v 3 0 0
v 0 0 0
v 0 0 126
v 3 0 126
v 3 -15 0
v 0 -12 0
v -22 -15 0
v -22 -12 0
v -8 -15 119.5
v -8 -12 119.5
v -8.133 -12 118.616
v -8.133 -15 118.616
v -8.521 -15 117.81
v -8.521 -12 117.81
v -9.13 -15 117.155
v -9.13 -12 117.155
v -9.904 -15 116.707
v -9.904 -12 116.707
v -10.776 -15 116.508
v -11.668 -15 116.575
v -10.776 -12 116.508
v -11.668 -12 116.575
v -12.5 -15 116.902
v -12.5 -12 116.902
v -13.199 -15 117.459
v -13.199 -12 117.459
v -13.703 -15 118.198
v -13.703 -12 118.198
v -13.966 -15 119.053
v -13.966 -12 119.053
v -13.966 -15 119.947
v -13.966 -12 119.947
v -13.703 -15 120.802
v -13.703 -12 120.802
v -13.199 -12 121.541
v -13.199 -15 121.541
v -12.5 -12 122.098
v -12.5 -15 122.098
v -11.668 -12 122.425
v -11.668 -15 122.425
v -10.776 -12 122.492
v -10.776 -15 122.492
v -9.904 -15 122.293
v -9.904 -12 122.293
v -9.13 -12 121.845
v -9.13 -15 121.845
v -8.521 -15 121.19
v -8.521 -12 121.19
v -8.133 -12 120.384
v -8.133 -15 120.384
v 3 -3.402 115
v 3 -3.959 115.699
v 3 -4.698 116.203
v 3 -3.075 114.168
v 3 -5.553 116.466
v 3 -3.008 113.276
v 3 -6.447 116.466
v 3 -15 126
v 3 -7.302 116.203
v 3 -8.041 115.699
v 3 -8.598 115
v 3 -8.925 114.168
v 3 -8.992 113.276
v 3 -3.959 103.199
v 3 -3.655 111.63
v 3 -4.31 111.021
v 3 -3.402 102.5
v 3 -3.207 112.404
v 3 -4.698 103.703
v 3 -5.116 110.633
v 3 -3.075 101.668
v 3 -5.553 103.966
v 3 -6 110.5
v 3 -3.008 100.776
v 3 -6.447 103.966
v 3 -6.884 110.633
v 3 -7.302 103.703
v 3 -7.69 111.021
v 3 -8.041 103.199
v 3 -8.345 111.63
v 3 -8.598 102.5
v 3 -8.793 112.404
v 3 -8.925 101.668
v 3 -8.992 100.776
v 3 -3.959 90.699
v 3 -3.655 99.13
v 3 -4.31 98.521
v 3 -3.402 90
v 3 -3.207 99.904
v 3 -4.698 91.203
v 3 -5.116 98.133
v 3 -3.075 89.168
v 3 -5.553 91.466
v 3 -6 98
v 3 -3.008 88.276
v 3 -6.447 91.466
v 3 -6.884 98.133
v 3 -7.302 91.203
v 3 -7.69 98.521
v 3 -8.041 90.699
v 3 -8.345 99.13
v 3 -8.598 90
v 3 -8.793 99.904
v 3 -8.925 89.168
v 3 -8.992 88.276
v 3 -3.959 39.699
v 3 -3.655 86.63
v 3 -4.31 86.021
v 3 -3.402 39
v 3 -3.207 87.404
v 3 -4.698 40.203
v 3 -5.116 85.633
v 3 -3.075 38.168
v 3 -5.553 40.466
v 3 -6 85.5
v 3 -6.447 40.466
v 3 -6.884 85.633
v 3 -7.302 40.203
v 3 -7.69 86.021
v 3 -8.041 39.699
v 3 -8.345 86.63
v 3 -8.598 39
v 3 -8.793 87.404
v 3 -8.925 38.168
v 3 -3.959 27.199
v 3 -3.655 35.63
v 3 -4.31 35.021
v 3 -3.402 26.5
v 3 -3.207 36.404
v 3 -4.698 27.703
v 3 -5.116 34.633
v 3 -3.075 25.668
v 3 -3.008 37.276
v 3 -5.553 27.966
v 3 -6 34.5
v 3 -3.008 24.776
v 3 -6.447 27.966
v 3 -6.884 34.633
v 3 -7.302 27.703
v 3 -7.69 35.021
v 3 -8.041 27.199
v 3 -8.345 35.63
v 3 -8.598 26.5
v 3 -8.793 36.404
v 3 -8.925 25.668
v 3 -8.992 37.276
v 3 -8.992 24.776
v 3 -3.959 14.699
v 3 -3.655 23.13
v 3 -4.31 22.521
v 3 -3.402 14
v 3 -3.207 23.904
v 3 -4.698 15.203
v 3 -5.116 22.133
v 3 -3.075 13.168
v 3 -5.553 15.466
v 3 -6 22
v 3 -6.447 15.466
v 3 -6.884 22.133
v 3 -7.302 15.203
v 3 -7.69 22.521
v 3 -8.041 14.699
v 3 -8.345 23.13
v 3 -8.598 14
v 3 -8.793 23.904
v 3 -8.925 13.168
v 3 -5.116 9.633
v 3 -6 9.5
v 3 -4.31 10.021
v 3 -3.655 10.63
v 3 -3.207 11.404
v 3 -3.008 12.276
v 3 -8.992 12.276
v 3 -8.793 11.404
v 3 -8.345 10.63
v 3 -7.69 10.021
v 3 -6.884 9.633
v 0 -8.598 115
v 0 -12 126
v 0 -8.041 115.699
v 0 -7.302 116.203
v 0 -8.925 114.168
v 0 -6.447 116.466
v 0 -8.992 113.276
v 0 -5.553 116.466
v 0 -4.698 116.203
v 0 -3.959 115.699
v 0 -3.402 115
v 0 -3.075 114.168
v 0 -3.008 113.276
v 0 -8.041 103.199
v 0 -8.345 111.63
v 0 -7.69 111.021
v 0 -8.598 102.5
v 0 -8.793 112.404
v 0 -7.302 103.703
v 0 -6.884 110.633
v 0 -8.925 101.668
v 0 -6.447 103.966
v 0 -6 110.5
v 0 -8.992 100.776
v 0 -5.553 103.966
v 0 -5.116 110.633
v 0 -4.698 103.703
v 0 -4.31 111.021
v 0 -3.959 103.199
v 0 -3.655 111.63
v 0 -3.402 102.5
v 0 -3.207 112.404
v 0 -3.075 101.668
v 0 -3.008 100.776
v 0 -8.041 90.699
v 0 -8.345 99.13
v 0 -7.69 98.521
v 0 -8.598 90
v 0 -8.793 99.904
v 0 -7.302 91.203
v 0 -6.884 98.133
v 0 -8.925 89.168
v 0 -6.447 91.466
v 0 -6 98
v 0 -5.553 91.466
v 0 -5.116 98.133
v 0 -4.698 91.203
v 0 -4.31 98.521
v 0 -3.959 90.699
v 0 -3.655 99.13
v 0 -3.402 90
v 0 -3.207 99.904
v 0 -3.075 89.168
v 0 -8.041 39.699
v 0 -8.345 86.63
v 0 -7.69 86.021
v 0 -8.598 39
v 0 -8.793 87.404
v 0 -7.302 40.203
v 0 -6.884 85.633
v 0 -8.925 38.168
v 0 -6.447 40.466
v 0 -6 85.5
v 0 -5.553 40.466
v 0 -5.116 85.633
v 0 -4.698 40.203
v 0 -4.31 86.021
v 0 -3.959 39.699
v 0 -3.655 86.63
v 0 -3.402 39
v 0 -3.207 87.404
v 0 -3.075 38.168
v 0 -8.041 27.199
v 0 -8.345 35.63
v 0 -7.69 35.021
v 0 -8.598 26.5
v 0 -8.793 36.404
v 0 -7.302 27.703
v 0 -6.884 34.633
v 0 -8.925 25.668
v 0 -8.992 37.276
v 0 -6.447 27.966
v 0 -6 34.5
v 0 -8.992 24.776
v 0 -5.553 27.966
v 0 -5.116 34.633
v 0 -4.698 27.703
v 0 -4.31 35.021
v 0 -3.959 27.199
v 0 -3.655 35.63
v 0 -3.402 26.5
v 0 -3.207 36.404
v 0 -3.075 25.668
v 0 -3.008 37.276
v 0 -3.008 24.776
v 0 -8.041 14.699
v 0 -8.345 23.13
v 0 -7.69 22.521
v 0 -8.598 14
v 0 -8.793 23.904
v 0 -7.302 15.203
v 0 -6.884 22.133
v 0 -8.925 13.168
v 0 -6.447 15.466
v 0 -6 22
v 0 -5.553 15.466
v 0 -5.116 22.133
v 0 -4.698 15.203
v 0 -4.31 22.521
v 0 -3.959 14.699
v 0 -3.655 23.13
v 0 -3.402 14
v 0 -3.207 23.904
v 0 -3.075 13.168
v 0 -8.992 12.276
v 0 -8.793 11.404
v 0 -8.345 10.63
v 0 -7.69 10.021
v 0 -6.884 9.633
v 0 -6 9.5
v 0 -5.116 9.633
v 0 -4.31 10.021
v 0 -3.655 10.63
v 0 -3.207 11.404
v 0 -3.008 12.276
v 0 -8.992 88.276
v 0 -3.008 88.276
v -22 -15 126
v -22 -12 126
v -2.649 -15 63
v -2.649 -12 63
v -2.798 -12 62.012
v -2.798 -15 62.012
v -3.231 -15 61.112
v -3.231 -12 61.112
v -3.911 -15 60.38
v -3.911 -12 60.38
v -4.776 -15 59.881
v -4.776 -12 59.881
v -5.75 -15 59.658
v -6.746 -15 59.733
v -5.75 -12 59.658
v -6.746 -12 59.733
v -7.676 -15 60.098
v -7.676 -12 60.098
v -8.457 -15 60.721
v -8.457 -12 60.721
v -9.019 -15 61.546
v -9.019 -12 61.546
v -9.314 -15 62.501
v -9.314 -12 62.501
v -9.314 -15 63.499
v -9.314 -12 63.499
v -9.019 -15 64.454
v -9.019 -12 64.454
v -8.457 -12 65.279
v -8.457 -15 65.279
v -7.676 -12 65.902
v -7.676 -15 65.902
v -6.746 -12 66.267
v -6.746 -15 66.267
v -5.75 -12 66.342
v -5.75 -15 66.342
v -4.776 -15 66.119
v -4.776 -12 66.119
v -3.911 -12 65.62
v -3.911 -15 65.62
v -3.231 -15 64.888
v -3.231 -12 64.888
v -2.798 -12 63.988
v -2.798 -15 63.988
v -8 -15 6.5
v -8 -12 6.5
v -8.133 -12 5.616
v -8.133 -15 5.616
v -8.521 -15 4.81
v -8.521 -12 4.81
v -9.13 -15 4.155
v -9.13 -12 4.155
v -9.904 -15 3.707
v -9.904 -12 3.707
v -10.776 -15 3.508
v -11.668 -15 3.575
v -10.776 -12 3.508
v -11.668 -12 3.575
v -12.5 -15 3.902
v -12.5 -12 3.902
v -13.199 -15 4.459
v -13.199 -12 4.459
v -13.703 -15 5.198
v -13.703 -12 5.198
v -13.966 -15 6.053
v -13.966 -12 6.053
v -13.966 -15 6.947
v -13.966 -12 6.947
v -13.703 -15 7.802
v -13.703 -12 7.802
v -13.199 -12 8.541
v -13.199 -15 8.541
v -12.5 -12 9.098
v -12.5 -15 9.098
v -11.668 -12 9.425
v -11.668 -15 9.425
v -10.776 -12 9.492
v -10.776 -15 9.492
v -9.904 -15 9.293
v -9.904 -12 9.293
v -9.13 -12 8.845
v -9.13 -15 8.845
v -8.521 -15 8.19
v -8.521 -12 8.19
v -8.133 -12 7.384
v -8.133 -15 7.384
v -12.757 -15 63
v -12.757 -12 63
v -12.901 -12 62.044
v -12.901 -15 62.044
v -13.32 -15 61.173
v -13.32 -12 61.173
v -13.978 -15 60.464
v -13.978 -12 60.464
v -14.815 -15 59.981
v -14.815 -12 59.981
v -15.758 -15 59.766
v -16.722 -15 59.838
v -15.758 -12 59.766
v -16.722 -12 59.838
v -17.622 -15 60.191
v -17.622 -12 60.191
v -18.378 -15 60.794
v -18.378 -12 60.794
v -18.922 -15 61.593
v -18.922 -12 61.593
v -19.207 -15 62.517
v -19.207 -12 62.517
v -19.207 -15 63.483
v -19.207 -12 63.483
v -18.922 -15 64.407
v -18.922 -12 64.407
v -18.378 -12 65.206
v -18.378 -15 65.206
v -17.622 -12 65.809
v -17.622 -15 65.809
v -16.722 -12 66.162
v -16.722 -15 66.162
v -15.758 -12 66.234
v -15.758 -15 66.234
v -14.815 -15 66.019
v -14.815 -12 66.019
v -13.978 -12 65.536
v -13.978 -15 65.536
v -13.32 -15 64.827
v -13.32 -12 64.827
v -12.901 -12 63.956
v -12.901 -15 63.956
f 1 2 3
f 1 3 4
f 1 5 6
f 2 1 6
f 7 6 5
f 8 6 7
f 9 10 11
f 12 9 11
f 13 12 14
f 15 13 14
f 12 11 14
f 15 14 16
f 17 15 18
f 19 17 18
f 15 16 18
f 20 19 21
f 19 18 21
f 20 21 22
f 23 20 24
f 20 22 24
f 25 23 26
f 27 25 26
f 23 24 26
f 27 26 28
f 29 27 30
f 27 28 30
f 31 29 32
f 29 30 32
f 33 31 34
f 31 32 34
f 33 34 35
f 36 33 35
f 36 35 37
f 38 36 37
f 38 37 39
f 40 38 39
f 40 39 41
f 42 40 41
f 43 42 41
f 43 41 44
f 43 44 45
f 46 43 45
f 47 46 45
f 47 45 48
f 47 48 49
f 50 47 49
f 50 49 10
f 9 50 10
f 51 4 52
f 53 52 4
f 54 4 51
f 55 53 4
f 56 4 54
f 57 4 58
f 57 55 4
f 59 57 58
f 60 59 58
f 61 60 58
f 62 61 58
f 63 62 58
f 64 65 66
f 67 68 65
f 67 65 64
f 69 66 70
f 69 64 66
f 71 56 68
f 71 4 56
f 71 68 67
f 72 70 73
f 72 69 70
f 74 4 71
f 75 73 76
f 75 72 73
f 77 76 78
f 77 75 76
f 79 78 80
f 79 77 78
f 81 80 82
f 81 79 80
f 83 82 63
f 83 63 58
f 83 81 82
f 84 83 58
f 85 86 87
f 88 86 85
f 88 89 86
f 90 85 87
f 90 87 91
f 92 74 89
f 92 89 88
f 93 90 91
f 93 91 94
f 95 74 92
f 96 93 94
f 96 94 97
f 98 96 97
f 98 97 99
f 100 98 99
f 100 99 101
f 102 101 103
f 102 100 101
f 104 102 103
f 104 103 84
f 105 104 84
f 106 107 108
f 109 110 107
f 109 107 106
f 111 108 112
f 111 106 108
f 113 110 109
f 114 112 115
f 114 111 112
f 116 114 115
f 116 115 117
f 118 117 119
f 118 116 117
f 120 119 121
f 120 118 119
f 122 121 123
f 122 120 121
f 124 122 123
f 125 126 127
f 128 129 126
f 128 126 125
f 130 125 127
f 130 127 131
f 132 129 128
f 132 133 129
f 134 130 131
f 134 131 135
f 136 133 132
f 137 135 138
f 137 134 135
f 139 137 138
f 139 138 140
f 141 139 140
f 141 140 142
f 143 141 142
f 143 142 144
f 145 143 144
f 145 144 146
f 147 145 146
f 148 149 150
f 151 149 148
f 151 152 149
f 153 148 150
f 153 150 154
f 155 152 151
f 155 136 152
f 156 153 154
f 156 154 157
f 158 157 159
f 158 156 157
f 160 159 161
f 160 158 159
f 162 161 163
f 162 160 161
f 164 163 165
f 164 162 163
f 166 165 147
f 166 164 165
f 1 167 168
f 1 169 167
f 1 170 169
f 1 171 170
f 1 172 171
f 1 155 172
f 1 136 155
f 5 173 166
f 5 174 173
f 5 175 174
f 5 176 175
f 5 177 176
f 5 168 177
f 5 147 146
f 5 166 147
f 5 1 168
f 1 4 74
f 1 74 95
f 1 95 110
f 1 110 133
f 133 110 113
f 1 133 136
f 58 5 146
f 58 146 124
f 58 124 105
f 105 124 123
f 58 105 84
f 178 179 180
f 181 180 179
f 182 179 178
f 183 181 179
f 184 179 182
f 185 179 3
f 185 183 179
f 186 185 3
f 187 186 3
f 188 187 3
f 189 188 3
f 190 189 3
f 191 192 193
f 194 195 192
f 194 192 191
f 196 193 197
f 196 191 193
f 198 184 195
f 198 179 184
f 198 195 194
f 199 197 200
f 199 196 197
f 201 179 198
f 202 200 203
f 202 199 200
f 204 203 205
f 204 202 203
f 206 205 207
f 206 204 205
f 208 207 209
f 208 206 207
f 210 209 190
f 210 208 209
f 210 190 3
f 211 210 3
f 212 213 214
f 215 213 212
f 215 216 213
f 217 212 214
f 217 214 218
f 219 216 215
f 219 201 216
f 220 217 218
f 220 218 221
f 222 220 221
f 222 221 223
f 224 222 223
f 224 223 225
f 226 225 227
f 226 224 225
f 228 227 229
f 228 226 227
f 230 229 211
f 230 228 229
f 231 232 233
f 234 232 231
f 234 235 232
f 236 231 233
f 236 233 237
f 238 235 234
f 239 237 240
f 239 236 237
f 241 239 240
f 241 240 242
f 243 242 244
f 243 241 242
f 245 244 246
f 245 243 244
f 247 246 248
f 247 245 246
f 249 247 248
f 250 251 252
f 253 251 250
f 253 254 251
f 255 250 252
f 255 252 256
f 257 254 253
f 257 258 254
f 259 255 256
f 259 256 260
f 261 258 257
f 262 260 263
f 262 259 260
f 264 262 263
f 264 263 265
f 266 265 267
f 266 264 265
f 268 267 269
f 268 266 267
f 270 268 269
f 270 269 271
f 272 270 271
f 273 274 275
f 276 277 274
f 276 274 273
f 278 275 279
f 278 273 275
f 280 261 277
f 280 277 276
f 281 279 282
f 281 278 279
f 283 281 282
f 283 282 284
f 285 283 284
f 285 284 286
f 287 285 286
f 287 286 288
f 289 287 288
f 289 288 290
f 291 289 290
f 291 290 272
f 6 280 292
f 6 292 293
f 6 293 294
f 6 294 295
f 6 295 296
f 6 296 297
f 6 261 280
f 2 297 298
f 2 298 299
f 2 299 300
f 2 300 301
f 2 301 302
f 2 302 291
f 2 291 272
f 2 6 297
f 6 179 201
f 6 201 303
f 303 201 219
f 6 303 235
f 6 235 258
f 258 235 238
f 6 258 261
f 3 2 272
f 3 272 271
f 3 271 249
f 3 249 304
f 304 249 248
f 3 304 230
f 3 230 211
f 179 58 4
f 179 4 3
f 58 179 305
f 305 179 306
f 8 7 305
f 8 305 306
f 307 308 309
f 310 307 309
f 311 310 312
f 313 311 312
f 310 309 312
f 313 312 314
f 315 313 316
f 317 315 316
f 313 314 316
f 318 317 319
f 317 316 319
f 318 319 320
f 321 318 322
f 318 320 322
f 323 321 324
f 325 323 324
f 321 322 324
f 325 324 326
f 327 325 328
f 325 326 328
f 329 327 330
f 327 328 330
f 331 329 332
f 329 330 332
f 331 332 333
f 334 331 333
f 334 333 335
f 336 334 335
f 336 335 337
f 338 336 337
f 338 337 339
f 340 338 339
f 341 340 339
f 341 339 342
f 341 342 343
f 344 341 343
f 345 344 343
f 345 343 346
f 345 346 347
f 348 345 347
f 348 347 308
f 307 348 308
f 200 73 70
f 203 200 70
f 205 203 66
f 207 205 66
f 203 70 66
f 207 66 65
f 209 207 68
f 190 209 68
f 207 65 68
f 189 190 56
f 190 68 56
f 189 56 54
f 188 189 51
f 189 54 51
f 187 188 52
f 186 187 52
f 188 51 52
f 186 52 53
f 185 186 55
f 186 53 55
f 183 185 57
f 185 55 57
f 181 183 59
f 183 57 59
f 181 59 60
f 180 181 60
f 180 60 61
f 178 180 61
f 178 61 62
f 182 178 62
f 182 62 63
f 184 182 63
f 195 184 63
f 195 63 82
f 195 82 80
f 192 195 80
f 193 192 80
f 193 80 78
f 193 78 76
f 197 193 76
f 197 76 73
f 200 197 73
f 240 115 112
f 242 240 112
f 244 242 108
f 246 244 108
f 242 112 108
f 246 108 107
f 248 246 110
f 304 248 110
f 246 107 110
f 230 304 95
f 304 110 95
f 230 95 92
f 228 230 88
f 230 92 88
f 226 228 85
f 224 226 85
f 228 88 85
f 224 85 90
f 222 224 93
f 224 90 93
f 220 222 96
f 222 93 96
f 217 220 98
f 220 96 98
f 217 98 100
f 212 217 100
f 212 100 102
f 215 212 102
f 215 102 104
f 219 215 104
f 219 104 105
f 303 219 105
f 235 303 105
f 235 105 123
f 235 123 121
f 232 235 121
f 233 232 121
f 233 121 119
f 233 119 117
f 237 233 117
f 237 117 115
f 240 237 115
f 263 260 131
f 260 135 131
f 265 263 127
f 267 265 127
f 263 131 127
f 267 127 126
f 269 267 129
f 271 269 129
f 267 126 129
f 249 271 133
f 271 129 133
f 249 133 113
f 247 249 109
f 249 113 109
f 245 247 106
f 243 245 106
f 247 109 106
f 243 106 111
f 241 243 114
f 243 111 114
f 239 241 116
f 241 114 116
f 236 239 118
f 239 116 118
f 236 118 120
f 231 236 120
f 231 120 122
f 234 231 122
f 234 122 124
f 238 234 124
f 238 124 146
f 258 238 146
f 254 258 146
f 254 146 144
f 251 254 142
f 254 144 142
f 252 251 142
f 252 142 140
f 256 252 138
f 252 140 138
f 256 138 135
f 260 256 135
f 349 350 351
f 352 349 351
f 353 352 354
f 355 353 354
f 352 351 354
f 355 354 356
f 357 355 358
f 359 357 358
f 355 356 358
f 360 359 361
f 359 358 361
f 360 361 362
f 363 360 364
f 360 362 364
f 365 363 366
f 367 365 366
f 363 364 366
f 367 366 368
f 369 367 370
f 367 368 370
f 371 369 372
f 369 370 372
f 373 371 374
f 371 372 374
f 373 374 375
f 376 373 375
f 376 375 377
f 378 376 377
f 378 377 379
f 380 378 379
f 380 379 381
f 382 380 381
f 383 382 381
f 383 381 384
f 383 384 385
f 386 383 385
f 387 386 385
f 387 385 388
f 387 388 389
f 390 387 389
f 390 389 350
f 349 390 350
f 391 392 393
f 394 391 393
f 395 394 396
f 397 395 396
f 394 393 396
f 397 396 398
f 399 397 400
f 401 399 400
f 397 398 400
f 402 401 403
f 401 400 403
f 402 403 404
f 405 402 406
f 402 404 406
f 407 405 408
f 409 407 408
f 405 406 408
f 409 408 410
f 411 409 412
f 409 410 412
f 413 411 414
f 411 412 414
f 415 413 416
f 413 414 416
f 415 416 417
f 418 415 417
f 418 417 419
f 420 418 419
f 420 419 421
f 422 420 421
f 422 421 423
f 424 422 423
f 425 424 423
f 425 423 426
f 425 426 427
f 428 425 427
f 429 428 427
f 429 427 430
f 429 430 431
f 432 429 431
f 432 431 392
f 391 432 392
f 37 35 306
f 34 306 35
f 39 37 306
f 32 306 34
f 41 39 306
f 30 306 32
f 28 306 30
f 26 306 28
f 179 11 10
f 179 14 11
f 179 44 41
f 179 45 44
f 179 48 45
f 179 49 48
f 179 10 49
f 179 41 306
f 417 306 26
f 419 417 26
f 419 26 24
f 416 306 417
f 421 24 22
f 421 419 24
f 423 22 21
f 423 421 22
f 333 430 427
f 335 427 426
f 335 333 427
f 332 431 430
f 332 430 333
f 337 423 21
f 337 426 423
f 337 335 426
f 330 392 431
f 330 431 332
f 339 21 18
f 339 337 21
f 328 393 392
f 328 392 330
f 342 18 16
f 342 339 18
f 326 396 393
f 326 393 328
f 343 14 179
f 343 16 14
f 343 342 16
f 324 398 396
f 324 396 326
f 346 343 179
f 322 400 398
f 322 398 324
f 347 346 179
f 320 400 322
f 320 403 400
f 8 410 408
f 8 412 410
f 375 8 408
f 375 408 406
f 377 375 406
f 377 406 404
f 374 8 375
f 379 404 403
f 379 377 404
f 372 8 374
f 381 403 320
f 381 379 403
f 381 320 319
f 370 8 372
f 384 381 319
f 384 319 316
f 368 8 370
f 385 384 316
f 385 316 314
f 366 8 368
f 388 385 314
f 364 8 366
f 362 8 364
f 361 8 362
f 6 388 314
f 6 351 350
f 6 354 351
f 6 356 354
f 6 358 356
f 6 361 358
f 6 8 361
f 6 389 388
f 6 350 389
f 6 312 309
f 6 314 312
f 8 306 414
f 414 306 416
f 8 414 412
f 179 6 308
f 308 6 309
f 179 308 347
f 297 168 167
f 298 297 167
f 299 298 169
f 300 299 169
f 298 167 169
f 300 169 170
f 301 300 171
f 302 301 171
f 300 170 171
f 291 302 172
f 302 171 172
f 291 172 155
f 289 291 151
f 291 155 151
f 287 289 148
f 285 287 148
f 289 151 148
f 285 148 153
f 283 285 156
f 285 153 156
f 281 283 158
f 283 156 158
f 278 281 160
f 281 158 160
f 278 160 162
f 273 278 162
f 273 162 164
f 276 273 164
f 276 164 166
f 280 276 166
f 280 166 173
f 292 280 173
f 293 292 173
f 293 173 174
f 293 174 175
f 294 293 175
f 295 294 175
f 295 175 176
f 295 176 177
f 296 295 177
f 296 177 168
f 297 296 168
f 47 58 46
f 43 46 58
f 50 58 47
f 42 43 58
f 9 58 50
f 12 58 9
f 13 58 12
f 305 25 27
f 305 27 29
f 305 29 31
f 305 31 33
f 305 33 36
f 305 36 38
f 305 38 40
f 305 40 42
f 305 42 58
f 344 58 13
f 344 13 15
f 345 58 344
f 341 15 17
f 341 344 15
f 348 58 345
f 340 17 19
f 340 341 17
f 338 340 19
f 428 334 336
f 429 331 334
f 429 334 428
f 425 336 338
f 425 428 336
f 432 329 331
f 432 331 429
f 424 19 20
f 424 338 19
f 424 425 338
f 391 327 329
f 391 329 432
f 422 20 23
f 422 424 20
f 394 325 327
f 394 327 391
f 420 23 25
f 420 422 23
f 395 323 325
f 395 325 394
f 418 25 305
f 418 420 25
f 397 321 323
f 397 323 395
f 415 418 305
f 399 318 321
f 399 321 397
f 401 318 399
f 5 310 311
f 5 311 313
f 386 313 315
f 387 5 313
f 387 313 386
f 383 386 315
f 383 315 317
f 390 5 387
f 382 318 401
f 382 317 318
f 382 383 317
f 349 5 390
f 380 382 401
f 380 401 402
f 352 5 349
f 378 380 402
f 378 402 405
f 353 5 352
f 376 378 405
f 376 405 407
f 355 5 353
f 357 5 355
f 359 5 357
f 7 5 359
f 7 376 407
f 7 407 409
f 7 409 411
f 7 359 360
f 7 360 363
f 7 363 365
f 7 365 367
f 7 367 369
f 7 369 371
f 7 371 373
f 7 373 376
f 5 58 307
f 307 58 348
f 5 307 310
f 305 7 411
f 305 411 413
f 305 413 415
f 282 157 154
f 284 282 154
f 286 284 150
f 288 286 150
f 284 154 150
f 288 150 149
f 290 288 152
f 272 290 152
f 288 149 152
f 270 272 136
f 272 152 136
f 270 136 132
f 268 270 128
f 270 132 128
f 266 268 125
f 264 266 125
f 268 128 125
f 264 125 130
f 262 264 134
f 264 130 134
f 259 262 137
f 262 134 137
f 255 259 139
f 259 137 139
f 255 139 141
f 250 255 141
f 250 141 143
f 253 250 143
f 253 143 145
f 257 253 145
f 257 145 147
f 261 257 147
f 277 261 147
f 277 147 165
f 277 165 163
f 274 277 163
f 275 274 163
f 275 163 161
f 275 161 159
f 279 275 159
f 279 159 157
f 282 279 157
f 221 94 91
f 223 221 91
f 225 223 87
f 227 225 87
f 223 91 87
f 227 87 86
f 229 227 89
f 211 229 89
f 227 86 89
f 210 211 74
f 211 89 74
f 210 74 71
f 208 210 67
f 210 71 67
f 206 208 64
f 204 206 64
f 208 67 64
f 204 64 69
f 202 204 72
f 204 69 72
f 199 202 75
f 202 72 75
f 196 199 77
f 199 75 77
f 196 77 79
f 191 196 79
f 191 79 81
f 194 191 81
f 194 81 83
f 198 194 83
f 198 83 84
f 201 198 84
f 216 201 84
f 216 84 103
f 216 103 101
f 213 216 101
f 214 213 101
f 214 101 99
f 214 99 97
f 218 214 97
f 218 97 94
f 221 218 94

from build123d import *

# Parameters (mm, degrees)
SALIENTE_EXTRUIR1_DEPTH = 126
CROQUIS2_R              = 3
CORTAR_EXTRUIR3_DEPTH   = 63
CROQUIS3_R              = 3
CROQUIS3_R_2            = 3.243437353
CROQUIS3_R_3            = 3.351130608
CORTAR_EXTRUIR4_DEPTH   = 10


with BuildPart() as part:
    # Croquis1 → Saliente-Extruir1 (new body)
    with BuildSketch(Plane.XY):
        Polygon((0, 0), (3, 0), (3, -15), (-22, -15), (-22, -12), (0, -12), align=None)
    extrude(amount=SALIENTE_EXTRUIR1_DEPTH)

    # Croquis2 → Cortar-Extruir3 (cut, symmetric)
    with BuildSketch(Plane(origin=(3, 0, 0), x_dir=(0, 0, -1), z_dir=(1, 0, 0))):
        with Locations((-113.5, -6)):
            Circle(CROQUIS2_R)
        with Locations((-101, -6)):
            Circle(CROQUIS2_R)
        with Locations((-88.5, -6)):
            Circle(CROQUIS2_R)
        with Locations((-12.5, -6)):
            Circle(CROQUIS2_R)
        with Locations((-25, -6)):
            Circle(CROQUIS2_R)
        with Locations((-37.5, -6)):
            Circle(CROQUIS2_R)
    extrude(amount=CORTAR_EXTRUIR3_DEPTH, both=True, mode=Mode.SUBTRACT)

    # Croquis3 → Cortar-Extruir4 (cut)
    with BuildSketch(Plane(origin=(0, -12, 0), x_dir=(1, 0, 0), z_dir=(0, 1, 0))):
        with Locations((-11, -6.5)):
            Circle(CROQUIS3_R)
        with Locations((-11, -119.5)):
            Circle(CROQUIS3_R)
        with Locations((-16, -63)):
            Circle(CROQUIS3_R_2)
        with Locations((-6, -63)):
            Circle(CROQUIS3_R_3)
    extrude(amount=-CORTAR_EXTRUIR4_DEPTH, mode=Mode.SUBTRACT)


solid = part.part
